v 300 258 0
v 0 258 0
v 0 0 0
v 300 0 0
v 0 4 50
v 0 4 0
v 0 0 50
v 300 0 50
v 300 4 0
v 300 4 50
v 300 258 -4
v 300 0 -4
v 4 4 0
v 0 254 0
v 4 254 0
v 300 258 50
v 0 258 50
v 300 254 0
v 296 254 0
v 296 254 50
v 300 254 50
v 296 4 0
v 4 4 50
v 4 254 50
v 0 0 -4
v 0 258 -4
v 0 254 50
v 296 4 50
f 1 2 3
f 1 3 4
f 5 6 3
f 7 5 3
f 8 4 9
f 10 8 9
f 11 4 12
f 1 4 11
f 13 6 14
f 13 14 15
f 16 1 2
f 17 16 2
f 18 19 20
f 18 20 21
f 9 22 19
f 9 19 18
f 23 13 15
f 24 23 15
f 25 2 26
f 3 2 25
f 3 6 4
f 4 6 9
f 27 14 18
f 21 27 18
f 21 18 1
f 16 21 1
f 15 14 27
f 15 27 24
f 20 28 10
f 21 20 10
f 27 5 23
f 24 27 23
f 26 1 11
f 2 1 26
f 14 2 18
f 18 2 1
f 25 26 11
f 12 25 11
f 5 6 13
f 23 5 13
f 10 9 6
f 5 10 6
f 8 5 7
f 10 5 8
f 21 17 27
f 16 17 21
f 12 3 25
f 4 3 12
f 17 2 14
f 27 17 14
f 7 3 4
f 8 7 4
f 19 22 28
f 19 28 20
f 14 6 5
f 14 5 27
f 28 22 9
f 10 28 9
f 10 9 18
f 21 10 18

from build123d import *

# Parameters (mm, degrees)
F0_W     = 4
F0_H     = 250
F0_W_2   = 292
F1_DEPTH = 4
F2_DEPTH = 50
F3_DEPTH = 50
F4_DEPTH = 50
F5_DEPTH = 50


with BuildPart() as f1:
    # F0 (on Top) → F1 (new body)
    with BuildSketch(Plane.XY):
        Polygon((300, 258), (0, 258), (0, 254), (4, 254), (296, 254), (300, 254), align=None)
        with Locations((2, 129)):
            Rectangle(F0_W, F0_H)
        with Locations((298, 129)):
            Rectangle(F0_W, F0_H)
        Polygon((4, 4), (0, 4), (0, 0), (300, 0), (300, 4), (296, 4), align=None)
        with Locations((150, 129)):
            Rectangle(F0_W_2, F0_H)
    extrude(amount=-F1_DEPTH)


with BuildPart() as f2:
    # F0 (on Top) → F2 (new body)
    with BuildSketch(Plane.XY):
        Polygon((4, 4), (0, 4), (0, 0), (300, 0), (300, 4), (296, 4), align=None)
    extrude(amount=F2_DEPTH)


with BuildPart() as f3:
    # F0 (on Top) → F3 (new body)
    with BuildSketch(Plane.XY):
        with Locations((2, 129)):
            Rectangle(F0_W, F0_H)
    extrude(amount=F3_DEPTH)


with BuildPart() as f4:
    # F0 (on Top) → F4 (new body)
    with BuildSketch(Plane.XY):
        Polygon((300, 258), (0, 258), (0, 254), (4, 254), (296, 254), (300, 254), align=None)
    extrude(amount=F4_DEPTH)


with BuildPart() as f5:
    # F0 (on Top) → F5 (new body)
    with BuildSketch(Plane.XY):
        with Locations((298, 129)):
            Rectangle(F0_W, F0_H)
    extrude(amount=F5_DEPTH)


solid = Compound([f1.part, f2.part, f3.part, f4.part, f5.part])
